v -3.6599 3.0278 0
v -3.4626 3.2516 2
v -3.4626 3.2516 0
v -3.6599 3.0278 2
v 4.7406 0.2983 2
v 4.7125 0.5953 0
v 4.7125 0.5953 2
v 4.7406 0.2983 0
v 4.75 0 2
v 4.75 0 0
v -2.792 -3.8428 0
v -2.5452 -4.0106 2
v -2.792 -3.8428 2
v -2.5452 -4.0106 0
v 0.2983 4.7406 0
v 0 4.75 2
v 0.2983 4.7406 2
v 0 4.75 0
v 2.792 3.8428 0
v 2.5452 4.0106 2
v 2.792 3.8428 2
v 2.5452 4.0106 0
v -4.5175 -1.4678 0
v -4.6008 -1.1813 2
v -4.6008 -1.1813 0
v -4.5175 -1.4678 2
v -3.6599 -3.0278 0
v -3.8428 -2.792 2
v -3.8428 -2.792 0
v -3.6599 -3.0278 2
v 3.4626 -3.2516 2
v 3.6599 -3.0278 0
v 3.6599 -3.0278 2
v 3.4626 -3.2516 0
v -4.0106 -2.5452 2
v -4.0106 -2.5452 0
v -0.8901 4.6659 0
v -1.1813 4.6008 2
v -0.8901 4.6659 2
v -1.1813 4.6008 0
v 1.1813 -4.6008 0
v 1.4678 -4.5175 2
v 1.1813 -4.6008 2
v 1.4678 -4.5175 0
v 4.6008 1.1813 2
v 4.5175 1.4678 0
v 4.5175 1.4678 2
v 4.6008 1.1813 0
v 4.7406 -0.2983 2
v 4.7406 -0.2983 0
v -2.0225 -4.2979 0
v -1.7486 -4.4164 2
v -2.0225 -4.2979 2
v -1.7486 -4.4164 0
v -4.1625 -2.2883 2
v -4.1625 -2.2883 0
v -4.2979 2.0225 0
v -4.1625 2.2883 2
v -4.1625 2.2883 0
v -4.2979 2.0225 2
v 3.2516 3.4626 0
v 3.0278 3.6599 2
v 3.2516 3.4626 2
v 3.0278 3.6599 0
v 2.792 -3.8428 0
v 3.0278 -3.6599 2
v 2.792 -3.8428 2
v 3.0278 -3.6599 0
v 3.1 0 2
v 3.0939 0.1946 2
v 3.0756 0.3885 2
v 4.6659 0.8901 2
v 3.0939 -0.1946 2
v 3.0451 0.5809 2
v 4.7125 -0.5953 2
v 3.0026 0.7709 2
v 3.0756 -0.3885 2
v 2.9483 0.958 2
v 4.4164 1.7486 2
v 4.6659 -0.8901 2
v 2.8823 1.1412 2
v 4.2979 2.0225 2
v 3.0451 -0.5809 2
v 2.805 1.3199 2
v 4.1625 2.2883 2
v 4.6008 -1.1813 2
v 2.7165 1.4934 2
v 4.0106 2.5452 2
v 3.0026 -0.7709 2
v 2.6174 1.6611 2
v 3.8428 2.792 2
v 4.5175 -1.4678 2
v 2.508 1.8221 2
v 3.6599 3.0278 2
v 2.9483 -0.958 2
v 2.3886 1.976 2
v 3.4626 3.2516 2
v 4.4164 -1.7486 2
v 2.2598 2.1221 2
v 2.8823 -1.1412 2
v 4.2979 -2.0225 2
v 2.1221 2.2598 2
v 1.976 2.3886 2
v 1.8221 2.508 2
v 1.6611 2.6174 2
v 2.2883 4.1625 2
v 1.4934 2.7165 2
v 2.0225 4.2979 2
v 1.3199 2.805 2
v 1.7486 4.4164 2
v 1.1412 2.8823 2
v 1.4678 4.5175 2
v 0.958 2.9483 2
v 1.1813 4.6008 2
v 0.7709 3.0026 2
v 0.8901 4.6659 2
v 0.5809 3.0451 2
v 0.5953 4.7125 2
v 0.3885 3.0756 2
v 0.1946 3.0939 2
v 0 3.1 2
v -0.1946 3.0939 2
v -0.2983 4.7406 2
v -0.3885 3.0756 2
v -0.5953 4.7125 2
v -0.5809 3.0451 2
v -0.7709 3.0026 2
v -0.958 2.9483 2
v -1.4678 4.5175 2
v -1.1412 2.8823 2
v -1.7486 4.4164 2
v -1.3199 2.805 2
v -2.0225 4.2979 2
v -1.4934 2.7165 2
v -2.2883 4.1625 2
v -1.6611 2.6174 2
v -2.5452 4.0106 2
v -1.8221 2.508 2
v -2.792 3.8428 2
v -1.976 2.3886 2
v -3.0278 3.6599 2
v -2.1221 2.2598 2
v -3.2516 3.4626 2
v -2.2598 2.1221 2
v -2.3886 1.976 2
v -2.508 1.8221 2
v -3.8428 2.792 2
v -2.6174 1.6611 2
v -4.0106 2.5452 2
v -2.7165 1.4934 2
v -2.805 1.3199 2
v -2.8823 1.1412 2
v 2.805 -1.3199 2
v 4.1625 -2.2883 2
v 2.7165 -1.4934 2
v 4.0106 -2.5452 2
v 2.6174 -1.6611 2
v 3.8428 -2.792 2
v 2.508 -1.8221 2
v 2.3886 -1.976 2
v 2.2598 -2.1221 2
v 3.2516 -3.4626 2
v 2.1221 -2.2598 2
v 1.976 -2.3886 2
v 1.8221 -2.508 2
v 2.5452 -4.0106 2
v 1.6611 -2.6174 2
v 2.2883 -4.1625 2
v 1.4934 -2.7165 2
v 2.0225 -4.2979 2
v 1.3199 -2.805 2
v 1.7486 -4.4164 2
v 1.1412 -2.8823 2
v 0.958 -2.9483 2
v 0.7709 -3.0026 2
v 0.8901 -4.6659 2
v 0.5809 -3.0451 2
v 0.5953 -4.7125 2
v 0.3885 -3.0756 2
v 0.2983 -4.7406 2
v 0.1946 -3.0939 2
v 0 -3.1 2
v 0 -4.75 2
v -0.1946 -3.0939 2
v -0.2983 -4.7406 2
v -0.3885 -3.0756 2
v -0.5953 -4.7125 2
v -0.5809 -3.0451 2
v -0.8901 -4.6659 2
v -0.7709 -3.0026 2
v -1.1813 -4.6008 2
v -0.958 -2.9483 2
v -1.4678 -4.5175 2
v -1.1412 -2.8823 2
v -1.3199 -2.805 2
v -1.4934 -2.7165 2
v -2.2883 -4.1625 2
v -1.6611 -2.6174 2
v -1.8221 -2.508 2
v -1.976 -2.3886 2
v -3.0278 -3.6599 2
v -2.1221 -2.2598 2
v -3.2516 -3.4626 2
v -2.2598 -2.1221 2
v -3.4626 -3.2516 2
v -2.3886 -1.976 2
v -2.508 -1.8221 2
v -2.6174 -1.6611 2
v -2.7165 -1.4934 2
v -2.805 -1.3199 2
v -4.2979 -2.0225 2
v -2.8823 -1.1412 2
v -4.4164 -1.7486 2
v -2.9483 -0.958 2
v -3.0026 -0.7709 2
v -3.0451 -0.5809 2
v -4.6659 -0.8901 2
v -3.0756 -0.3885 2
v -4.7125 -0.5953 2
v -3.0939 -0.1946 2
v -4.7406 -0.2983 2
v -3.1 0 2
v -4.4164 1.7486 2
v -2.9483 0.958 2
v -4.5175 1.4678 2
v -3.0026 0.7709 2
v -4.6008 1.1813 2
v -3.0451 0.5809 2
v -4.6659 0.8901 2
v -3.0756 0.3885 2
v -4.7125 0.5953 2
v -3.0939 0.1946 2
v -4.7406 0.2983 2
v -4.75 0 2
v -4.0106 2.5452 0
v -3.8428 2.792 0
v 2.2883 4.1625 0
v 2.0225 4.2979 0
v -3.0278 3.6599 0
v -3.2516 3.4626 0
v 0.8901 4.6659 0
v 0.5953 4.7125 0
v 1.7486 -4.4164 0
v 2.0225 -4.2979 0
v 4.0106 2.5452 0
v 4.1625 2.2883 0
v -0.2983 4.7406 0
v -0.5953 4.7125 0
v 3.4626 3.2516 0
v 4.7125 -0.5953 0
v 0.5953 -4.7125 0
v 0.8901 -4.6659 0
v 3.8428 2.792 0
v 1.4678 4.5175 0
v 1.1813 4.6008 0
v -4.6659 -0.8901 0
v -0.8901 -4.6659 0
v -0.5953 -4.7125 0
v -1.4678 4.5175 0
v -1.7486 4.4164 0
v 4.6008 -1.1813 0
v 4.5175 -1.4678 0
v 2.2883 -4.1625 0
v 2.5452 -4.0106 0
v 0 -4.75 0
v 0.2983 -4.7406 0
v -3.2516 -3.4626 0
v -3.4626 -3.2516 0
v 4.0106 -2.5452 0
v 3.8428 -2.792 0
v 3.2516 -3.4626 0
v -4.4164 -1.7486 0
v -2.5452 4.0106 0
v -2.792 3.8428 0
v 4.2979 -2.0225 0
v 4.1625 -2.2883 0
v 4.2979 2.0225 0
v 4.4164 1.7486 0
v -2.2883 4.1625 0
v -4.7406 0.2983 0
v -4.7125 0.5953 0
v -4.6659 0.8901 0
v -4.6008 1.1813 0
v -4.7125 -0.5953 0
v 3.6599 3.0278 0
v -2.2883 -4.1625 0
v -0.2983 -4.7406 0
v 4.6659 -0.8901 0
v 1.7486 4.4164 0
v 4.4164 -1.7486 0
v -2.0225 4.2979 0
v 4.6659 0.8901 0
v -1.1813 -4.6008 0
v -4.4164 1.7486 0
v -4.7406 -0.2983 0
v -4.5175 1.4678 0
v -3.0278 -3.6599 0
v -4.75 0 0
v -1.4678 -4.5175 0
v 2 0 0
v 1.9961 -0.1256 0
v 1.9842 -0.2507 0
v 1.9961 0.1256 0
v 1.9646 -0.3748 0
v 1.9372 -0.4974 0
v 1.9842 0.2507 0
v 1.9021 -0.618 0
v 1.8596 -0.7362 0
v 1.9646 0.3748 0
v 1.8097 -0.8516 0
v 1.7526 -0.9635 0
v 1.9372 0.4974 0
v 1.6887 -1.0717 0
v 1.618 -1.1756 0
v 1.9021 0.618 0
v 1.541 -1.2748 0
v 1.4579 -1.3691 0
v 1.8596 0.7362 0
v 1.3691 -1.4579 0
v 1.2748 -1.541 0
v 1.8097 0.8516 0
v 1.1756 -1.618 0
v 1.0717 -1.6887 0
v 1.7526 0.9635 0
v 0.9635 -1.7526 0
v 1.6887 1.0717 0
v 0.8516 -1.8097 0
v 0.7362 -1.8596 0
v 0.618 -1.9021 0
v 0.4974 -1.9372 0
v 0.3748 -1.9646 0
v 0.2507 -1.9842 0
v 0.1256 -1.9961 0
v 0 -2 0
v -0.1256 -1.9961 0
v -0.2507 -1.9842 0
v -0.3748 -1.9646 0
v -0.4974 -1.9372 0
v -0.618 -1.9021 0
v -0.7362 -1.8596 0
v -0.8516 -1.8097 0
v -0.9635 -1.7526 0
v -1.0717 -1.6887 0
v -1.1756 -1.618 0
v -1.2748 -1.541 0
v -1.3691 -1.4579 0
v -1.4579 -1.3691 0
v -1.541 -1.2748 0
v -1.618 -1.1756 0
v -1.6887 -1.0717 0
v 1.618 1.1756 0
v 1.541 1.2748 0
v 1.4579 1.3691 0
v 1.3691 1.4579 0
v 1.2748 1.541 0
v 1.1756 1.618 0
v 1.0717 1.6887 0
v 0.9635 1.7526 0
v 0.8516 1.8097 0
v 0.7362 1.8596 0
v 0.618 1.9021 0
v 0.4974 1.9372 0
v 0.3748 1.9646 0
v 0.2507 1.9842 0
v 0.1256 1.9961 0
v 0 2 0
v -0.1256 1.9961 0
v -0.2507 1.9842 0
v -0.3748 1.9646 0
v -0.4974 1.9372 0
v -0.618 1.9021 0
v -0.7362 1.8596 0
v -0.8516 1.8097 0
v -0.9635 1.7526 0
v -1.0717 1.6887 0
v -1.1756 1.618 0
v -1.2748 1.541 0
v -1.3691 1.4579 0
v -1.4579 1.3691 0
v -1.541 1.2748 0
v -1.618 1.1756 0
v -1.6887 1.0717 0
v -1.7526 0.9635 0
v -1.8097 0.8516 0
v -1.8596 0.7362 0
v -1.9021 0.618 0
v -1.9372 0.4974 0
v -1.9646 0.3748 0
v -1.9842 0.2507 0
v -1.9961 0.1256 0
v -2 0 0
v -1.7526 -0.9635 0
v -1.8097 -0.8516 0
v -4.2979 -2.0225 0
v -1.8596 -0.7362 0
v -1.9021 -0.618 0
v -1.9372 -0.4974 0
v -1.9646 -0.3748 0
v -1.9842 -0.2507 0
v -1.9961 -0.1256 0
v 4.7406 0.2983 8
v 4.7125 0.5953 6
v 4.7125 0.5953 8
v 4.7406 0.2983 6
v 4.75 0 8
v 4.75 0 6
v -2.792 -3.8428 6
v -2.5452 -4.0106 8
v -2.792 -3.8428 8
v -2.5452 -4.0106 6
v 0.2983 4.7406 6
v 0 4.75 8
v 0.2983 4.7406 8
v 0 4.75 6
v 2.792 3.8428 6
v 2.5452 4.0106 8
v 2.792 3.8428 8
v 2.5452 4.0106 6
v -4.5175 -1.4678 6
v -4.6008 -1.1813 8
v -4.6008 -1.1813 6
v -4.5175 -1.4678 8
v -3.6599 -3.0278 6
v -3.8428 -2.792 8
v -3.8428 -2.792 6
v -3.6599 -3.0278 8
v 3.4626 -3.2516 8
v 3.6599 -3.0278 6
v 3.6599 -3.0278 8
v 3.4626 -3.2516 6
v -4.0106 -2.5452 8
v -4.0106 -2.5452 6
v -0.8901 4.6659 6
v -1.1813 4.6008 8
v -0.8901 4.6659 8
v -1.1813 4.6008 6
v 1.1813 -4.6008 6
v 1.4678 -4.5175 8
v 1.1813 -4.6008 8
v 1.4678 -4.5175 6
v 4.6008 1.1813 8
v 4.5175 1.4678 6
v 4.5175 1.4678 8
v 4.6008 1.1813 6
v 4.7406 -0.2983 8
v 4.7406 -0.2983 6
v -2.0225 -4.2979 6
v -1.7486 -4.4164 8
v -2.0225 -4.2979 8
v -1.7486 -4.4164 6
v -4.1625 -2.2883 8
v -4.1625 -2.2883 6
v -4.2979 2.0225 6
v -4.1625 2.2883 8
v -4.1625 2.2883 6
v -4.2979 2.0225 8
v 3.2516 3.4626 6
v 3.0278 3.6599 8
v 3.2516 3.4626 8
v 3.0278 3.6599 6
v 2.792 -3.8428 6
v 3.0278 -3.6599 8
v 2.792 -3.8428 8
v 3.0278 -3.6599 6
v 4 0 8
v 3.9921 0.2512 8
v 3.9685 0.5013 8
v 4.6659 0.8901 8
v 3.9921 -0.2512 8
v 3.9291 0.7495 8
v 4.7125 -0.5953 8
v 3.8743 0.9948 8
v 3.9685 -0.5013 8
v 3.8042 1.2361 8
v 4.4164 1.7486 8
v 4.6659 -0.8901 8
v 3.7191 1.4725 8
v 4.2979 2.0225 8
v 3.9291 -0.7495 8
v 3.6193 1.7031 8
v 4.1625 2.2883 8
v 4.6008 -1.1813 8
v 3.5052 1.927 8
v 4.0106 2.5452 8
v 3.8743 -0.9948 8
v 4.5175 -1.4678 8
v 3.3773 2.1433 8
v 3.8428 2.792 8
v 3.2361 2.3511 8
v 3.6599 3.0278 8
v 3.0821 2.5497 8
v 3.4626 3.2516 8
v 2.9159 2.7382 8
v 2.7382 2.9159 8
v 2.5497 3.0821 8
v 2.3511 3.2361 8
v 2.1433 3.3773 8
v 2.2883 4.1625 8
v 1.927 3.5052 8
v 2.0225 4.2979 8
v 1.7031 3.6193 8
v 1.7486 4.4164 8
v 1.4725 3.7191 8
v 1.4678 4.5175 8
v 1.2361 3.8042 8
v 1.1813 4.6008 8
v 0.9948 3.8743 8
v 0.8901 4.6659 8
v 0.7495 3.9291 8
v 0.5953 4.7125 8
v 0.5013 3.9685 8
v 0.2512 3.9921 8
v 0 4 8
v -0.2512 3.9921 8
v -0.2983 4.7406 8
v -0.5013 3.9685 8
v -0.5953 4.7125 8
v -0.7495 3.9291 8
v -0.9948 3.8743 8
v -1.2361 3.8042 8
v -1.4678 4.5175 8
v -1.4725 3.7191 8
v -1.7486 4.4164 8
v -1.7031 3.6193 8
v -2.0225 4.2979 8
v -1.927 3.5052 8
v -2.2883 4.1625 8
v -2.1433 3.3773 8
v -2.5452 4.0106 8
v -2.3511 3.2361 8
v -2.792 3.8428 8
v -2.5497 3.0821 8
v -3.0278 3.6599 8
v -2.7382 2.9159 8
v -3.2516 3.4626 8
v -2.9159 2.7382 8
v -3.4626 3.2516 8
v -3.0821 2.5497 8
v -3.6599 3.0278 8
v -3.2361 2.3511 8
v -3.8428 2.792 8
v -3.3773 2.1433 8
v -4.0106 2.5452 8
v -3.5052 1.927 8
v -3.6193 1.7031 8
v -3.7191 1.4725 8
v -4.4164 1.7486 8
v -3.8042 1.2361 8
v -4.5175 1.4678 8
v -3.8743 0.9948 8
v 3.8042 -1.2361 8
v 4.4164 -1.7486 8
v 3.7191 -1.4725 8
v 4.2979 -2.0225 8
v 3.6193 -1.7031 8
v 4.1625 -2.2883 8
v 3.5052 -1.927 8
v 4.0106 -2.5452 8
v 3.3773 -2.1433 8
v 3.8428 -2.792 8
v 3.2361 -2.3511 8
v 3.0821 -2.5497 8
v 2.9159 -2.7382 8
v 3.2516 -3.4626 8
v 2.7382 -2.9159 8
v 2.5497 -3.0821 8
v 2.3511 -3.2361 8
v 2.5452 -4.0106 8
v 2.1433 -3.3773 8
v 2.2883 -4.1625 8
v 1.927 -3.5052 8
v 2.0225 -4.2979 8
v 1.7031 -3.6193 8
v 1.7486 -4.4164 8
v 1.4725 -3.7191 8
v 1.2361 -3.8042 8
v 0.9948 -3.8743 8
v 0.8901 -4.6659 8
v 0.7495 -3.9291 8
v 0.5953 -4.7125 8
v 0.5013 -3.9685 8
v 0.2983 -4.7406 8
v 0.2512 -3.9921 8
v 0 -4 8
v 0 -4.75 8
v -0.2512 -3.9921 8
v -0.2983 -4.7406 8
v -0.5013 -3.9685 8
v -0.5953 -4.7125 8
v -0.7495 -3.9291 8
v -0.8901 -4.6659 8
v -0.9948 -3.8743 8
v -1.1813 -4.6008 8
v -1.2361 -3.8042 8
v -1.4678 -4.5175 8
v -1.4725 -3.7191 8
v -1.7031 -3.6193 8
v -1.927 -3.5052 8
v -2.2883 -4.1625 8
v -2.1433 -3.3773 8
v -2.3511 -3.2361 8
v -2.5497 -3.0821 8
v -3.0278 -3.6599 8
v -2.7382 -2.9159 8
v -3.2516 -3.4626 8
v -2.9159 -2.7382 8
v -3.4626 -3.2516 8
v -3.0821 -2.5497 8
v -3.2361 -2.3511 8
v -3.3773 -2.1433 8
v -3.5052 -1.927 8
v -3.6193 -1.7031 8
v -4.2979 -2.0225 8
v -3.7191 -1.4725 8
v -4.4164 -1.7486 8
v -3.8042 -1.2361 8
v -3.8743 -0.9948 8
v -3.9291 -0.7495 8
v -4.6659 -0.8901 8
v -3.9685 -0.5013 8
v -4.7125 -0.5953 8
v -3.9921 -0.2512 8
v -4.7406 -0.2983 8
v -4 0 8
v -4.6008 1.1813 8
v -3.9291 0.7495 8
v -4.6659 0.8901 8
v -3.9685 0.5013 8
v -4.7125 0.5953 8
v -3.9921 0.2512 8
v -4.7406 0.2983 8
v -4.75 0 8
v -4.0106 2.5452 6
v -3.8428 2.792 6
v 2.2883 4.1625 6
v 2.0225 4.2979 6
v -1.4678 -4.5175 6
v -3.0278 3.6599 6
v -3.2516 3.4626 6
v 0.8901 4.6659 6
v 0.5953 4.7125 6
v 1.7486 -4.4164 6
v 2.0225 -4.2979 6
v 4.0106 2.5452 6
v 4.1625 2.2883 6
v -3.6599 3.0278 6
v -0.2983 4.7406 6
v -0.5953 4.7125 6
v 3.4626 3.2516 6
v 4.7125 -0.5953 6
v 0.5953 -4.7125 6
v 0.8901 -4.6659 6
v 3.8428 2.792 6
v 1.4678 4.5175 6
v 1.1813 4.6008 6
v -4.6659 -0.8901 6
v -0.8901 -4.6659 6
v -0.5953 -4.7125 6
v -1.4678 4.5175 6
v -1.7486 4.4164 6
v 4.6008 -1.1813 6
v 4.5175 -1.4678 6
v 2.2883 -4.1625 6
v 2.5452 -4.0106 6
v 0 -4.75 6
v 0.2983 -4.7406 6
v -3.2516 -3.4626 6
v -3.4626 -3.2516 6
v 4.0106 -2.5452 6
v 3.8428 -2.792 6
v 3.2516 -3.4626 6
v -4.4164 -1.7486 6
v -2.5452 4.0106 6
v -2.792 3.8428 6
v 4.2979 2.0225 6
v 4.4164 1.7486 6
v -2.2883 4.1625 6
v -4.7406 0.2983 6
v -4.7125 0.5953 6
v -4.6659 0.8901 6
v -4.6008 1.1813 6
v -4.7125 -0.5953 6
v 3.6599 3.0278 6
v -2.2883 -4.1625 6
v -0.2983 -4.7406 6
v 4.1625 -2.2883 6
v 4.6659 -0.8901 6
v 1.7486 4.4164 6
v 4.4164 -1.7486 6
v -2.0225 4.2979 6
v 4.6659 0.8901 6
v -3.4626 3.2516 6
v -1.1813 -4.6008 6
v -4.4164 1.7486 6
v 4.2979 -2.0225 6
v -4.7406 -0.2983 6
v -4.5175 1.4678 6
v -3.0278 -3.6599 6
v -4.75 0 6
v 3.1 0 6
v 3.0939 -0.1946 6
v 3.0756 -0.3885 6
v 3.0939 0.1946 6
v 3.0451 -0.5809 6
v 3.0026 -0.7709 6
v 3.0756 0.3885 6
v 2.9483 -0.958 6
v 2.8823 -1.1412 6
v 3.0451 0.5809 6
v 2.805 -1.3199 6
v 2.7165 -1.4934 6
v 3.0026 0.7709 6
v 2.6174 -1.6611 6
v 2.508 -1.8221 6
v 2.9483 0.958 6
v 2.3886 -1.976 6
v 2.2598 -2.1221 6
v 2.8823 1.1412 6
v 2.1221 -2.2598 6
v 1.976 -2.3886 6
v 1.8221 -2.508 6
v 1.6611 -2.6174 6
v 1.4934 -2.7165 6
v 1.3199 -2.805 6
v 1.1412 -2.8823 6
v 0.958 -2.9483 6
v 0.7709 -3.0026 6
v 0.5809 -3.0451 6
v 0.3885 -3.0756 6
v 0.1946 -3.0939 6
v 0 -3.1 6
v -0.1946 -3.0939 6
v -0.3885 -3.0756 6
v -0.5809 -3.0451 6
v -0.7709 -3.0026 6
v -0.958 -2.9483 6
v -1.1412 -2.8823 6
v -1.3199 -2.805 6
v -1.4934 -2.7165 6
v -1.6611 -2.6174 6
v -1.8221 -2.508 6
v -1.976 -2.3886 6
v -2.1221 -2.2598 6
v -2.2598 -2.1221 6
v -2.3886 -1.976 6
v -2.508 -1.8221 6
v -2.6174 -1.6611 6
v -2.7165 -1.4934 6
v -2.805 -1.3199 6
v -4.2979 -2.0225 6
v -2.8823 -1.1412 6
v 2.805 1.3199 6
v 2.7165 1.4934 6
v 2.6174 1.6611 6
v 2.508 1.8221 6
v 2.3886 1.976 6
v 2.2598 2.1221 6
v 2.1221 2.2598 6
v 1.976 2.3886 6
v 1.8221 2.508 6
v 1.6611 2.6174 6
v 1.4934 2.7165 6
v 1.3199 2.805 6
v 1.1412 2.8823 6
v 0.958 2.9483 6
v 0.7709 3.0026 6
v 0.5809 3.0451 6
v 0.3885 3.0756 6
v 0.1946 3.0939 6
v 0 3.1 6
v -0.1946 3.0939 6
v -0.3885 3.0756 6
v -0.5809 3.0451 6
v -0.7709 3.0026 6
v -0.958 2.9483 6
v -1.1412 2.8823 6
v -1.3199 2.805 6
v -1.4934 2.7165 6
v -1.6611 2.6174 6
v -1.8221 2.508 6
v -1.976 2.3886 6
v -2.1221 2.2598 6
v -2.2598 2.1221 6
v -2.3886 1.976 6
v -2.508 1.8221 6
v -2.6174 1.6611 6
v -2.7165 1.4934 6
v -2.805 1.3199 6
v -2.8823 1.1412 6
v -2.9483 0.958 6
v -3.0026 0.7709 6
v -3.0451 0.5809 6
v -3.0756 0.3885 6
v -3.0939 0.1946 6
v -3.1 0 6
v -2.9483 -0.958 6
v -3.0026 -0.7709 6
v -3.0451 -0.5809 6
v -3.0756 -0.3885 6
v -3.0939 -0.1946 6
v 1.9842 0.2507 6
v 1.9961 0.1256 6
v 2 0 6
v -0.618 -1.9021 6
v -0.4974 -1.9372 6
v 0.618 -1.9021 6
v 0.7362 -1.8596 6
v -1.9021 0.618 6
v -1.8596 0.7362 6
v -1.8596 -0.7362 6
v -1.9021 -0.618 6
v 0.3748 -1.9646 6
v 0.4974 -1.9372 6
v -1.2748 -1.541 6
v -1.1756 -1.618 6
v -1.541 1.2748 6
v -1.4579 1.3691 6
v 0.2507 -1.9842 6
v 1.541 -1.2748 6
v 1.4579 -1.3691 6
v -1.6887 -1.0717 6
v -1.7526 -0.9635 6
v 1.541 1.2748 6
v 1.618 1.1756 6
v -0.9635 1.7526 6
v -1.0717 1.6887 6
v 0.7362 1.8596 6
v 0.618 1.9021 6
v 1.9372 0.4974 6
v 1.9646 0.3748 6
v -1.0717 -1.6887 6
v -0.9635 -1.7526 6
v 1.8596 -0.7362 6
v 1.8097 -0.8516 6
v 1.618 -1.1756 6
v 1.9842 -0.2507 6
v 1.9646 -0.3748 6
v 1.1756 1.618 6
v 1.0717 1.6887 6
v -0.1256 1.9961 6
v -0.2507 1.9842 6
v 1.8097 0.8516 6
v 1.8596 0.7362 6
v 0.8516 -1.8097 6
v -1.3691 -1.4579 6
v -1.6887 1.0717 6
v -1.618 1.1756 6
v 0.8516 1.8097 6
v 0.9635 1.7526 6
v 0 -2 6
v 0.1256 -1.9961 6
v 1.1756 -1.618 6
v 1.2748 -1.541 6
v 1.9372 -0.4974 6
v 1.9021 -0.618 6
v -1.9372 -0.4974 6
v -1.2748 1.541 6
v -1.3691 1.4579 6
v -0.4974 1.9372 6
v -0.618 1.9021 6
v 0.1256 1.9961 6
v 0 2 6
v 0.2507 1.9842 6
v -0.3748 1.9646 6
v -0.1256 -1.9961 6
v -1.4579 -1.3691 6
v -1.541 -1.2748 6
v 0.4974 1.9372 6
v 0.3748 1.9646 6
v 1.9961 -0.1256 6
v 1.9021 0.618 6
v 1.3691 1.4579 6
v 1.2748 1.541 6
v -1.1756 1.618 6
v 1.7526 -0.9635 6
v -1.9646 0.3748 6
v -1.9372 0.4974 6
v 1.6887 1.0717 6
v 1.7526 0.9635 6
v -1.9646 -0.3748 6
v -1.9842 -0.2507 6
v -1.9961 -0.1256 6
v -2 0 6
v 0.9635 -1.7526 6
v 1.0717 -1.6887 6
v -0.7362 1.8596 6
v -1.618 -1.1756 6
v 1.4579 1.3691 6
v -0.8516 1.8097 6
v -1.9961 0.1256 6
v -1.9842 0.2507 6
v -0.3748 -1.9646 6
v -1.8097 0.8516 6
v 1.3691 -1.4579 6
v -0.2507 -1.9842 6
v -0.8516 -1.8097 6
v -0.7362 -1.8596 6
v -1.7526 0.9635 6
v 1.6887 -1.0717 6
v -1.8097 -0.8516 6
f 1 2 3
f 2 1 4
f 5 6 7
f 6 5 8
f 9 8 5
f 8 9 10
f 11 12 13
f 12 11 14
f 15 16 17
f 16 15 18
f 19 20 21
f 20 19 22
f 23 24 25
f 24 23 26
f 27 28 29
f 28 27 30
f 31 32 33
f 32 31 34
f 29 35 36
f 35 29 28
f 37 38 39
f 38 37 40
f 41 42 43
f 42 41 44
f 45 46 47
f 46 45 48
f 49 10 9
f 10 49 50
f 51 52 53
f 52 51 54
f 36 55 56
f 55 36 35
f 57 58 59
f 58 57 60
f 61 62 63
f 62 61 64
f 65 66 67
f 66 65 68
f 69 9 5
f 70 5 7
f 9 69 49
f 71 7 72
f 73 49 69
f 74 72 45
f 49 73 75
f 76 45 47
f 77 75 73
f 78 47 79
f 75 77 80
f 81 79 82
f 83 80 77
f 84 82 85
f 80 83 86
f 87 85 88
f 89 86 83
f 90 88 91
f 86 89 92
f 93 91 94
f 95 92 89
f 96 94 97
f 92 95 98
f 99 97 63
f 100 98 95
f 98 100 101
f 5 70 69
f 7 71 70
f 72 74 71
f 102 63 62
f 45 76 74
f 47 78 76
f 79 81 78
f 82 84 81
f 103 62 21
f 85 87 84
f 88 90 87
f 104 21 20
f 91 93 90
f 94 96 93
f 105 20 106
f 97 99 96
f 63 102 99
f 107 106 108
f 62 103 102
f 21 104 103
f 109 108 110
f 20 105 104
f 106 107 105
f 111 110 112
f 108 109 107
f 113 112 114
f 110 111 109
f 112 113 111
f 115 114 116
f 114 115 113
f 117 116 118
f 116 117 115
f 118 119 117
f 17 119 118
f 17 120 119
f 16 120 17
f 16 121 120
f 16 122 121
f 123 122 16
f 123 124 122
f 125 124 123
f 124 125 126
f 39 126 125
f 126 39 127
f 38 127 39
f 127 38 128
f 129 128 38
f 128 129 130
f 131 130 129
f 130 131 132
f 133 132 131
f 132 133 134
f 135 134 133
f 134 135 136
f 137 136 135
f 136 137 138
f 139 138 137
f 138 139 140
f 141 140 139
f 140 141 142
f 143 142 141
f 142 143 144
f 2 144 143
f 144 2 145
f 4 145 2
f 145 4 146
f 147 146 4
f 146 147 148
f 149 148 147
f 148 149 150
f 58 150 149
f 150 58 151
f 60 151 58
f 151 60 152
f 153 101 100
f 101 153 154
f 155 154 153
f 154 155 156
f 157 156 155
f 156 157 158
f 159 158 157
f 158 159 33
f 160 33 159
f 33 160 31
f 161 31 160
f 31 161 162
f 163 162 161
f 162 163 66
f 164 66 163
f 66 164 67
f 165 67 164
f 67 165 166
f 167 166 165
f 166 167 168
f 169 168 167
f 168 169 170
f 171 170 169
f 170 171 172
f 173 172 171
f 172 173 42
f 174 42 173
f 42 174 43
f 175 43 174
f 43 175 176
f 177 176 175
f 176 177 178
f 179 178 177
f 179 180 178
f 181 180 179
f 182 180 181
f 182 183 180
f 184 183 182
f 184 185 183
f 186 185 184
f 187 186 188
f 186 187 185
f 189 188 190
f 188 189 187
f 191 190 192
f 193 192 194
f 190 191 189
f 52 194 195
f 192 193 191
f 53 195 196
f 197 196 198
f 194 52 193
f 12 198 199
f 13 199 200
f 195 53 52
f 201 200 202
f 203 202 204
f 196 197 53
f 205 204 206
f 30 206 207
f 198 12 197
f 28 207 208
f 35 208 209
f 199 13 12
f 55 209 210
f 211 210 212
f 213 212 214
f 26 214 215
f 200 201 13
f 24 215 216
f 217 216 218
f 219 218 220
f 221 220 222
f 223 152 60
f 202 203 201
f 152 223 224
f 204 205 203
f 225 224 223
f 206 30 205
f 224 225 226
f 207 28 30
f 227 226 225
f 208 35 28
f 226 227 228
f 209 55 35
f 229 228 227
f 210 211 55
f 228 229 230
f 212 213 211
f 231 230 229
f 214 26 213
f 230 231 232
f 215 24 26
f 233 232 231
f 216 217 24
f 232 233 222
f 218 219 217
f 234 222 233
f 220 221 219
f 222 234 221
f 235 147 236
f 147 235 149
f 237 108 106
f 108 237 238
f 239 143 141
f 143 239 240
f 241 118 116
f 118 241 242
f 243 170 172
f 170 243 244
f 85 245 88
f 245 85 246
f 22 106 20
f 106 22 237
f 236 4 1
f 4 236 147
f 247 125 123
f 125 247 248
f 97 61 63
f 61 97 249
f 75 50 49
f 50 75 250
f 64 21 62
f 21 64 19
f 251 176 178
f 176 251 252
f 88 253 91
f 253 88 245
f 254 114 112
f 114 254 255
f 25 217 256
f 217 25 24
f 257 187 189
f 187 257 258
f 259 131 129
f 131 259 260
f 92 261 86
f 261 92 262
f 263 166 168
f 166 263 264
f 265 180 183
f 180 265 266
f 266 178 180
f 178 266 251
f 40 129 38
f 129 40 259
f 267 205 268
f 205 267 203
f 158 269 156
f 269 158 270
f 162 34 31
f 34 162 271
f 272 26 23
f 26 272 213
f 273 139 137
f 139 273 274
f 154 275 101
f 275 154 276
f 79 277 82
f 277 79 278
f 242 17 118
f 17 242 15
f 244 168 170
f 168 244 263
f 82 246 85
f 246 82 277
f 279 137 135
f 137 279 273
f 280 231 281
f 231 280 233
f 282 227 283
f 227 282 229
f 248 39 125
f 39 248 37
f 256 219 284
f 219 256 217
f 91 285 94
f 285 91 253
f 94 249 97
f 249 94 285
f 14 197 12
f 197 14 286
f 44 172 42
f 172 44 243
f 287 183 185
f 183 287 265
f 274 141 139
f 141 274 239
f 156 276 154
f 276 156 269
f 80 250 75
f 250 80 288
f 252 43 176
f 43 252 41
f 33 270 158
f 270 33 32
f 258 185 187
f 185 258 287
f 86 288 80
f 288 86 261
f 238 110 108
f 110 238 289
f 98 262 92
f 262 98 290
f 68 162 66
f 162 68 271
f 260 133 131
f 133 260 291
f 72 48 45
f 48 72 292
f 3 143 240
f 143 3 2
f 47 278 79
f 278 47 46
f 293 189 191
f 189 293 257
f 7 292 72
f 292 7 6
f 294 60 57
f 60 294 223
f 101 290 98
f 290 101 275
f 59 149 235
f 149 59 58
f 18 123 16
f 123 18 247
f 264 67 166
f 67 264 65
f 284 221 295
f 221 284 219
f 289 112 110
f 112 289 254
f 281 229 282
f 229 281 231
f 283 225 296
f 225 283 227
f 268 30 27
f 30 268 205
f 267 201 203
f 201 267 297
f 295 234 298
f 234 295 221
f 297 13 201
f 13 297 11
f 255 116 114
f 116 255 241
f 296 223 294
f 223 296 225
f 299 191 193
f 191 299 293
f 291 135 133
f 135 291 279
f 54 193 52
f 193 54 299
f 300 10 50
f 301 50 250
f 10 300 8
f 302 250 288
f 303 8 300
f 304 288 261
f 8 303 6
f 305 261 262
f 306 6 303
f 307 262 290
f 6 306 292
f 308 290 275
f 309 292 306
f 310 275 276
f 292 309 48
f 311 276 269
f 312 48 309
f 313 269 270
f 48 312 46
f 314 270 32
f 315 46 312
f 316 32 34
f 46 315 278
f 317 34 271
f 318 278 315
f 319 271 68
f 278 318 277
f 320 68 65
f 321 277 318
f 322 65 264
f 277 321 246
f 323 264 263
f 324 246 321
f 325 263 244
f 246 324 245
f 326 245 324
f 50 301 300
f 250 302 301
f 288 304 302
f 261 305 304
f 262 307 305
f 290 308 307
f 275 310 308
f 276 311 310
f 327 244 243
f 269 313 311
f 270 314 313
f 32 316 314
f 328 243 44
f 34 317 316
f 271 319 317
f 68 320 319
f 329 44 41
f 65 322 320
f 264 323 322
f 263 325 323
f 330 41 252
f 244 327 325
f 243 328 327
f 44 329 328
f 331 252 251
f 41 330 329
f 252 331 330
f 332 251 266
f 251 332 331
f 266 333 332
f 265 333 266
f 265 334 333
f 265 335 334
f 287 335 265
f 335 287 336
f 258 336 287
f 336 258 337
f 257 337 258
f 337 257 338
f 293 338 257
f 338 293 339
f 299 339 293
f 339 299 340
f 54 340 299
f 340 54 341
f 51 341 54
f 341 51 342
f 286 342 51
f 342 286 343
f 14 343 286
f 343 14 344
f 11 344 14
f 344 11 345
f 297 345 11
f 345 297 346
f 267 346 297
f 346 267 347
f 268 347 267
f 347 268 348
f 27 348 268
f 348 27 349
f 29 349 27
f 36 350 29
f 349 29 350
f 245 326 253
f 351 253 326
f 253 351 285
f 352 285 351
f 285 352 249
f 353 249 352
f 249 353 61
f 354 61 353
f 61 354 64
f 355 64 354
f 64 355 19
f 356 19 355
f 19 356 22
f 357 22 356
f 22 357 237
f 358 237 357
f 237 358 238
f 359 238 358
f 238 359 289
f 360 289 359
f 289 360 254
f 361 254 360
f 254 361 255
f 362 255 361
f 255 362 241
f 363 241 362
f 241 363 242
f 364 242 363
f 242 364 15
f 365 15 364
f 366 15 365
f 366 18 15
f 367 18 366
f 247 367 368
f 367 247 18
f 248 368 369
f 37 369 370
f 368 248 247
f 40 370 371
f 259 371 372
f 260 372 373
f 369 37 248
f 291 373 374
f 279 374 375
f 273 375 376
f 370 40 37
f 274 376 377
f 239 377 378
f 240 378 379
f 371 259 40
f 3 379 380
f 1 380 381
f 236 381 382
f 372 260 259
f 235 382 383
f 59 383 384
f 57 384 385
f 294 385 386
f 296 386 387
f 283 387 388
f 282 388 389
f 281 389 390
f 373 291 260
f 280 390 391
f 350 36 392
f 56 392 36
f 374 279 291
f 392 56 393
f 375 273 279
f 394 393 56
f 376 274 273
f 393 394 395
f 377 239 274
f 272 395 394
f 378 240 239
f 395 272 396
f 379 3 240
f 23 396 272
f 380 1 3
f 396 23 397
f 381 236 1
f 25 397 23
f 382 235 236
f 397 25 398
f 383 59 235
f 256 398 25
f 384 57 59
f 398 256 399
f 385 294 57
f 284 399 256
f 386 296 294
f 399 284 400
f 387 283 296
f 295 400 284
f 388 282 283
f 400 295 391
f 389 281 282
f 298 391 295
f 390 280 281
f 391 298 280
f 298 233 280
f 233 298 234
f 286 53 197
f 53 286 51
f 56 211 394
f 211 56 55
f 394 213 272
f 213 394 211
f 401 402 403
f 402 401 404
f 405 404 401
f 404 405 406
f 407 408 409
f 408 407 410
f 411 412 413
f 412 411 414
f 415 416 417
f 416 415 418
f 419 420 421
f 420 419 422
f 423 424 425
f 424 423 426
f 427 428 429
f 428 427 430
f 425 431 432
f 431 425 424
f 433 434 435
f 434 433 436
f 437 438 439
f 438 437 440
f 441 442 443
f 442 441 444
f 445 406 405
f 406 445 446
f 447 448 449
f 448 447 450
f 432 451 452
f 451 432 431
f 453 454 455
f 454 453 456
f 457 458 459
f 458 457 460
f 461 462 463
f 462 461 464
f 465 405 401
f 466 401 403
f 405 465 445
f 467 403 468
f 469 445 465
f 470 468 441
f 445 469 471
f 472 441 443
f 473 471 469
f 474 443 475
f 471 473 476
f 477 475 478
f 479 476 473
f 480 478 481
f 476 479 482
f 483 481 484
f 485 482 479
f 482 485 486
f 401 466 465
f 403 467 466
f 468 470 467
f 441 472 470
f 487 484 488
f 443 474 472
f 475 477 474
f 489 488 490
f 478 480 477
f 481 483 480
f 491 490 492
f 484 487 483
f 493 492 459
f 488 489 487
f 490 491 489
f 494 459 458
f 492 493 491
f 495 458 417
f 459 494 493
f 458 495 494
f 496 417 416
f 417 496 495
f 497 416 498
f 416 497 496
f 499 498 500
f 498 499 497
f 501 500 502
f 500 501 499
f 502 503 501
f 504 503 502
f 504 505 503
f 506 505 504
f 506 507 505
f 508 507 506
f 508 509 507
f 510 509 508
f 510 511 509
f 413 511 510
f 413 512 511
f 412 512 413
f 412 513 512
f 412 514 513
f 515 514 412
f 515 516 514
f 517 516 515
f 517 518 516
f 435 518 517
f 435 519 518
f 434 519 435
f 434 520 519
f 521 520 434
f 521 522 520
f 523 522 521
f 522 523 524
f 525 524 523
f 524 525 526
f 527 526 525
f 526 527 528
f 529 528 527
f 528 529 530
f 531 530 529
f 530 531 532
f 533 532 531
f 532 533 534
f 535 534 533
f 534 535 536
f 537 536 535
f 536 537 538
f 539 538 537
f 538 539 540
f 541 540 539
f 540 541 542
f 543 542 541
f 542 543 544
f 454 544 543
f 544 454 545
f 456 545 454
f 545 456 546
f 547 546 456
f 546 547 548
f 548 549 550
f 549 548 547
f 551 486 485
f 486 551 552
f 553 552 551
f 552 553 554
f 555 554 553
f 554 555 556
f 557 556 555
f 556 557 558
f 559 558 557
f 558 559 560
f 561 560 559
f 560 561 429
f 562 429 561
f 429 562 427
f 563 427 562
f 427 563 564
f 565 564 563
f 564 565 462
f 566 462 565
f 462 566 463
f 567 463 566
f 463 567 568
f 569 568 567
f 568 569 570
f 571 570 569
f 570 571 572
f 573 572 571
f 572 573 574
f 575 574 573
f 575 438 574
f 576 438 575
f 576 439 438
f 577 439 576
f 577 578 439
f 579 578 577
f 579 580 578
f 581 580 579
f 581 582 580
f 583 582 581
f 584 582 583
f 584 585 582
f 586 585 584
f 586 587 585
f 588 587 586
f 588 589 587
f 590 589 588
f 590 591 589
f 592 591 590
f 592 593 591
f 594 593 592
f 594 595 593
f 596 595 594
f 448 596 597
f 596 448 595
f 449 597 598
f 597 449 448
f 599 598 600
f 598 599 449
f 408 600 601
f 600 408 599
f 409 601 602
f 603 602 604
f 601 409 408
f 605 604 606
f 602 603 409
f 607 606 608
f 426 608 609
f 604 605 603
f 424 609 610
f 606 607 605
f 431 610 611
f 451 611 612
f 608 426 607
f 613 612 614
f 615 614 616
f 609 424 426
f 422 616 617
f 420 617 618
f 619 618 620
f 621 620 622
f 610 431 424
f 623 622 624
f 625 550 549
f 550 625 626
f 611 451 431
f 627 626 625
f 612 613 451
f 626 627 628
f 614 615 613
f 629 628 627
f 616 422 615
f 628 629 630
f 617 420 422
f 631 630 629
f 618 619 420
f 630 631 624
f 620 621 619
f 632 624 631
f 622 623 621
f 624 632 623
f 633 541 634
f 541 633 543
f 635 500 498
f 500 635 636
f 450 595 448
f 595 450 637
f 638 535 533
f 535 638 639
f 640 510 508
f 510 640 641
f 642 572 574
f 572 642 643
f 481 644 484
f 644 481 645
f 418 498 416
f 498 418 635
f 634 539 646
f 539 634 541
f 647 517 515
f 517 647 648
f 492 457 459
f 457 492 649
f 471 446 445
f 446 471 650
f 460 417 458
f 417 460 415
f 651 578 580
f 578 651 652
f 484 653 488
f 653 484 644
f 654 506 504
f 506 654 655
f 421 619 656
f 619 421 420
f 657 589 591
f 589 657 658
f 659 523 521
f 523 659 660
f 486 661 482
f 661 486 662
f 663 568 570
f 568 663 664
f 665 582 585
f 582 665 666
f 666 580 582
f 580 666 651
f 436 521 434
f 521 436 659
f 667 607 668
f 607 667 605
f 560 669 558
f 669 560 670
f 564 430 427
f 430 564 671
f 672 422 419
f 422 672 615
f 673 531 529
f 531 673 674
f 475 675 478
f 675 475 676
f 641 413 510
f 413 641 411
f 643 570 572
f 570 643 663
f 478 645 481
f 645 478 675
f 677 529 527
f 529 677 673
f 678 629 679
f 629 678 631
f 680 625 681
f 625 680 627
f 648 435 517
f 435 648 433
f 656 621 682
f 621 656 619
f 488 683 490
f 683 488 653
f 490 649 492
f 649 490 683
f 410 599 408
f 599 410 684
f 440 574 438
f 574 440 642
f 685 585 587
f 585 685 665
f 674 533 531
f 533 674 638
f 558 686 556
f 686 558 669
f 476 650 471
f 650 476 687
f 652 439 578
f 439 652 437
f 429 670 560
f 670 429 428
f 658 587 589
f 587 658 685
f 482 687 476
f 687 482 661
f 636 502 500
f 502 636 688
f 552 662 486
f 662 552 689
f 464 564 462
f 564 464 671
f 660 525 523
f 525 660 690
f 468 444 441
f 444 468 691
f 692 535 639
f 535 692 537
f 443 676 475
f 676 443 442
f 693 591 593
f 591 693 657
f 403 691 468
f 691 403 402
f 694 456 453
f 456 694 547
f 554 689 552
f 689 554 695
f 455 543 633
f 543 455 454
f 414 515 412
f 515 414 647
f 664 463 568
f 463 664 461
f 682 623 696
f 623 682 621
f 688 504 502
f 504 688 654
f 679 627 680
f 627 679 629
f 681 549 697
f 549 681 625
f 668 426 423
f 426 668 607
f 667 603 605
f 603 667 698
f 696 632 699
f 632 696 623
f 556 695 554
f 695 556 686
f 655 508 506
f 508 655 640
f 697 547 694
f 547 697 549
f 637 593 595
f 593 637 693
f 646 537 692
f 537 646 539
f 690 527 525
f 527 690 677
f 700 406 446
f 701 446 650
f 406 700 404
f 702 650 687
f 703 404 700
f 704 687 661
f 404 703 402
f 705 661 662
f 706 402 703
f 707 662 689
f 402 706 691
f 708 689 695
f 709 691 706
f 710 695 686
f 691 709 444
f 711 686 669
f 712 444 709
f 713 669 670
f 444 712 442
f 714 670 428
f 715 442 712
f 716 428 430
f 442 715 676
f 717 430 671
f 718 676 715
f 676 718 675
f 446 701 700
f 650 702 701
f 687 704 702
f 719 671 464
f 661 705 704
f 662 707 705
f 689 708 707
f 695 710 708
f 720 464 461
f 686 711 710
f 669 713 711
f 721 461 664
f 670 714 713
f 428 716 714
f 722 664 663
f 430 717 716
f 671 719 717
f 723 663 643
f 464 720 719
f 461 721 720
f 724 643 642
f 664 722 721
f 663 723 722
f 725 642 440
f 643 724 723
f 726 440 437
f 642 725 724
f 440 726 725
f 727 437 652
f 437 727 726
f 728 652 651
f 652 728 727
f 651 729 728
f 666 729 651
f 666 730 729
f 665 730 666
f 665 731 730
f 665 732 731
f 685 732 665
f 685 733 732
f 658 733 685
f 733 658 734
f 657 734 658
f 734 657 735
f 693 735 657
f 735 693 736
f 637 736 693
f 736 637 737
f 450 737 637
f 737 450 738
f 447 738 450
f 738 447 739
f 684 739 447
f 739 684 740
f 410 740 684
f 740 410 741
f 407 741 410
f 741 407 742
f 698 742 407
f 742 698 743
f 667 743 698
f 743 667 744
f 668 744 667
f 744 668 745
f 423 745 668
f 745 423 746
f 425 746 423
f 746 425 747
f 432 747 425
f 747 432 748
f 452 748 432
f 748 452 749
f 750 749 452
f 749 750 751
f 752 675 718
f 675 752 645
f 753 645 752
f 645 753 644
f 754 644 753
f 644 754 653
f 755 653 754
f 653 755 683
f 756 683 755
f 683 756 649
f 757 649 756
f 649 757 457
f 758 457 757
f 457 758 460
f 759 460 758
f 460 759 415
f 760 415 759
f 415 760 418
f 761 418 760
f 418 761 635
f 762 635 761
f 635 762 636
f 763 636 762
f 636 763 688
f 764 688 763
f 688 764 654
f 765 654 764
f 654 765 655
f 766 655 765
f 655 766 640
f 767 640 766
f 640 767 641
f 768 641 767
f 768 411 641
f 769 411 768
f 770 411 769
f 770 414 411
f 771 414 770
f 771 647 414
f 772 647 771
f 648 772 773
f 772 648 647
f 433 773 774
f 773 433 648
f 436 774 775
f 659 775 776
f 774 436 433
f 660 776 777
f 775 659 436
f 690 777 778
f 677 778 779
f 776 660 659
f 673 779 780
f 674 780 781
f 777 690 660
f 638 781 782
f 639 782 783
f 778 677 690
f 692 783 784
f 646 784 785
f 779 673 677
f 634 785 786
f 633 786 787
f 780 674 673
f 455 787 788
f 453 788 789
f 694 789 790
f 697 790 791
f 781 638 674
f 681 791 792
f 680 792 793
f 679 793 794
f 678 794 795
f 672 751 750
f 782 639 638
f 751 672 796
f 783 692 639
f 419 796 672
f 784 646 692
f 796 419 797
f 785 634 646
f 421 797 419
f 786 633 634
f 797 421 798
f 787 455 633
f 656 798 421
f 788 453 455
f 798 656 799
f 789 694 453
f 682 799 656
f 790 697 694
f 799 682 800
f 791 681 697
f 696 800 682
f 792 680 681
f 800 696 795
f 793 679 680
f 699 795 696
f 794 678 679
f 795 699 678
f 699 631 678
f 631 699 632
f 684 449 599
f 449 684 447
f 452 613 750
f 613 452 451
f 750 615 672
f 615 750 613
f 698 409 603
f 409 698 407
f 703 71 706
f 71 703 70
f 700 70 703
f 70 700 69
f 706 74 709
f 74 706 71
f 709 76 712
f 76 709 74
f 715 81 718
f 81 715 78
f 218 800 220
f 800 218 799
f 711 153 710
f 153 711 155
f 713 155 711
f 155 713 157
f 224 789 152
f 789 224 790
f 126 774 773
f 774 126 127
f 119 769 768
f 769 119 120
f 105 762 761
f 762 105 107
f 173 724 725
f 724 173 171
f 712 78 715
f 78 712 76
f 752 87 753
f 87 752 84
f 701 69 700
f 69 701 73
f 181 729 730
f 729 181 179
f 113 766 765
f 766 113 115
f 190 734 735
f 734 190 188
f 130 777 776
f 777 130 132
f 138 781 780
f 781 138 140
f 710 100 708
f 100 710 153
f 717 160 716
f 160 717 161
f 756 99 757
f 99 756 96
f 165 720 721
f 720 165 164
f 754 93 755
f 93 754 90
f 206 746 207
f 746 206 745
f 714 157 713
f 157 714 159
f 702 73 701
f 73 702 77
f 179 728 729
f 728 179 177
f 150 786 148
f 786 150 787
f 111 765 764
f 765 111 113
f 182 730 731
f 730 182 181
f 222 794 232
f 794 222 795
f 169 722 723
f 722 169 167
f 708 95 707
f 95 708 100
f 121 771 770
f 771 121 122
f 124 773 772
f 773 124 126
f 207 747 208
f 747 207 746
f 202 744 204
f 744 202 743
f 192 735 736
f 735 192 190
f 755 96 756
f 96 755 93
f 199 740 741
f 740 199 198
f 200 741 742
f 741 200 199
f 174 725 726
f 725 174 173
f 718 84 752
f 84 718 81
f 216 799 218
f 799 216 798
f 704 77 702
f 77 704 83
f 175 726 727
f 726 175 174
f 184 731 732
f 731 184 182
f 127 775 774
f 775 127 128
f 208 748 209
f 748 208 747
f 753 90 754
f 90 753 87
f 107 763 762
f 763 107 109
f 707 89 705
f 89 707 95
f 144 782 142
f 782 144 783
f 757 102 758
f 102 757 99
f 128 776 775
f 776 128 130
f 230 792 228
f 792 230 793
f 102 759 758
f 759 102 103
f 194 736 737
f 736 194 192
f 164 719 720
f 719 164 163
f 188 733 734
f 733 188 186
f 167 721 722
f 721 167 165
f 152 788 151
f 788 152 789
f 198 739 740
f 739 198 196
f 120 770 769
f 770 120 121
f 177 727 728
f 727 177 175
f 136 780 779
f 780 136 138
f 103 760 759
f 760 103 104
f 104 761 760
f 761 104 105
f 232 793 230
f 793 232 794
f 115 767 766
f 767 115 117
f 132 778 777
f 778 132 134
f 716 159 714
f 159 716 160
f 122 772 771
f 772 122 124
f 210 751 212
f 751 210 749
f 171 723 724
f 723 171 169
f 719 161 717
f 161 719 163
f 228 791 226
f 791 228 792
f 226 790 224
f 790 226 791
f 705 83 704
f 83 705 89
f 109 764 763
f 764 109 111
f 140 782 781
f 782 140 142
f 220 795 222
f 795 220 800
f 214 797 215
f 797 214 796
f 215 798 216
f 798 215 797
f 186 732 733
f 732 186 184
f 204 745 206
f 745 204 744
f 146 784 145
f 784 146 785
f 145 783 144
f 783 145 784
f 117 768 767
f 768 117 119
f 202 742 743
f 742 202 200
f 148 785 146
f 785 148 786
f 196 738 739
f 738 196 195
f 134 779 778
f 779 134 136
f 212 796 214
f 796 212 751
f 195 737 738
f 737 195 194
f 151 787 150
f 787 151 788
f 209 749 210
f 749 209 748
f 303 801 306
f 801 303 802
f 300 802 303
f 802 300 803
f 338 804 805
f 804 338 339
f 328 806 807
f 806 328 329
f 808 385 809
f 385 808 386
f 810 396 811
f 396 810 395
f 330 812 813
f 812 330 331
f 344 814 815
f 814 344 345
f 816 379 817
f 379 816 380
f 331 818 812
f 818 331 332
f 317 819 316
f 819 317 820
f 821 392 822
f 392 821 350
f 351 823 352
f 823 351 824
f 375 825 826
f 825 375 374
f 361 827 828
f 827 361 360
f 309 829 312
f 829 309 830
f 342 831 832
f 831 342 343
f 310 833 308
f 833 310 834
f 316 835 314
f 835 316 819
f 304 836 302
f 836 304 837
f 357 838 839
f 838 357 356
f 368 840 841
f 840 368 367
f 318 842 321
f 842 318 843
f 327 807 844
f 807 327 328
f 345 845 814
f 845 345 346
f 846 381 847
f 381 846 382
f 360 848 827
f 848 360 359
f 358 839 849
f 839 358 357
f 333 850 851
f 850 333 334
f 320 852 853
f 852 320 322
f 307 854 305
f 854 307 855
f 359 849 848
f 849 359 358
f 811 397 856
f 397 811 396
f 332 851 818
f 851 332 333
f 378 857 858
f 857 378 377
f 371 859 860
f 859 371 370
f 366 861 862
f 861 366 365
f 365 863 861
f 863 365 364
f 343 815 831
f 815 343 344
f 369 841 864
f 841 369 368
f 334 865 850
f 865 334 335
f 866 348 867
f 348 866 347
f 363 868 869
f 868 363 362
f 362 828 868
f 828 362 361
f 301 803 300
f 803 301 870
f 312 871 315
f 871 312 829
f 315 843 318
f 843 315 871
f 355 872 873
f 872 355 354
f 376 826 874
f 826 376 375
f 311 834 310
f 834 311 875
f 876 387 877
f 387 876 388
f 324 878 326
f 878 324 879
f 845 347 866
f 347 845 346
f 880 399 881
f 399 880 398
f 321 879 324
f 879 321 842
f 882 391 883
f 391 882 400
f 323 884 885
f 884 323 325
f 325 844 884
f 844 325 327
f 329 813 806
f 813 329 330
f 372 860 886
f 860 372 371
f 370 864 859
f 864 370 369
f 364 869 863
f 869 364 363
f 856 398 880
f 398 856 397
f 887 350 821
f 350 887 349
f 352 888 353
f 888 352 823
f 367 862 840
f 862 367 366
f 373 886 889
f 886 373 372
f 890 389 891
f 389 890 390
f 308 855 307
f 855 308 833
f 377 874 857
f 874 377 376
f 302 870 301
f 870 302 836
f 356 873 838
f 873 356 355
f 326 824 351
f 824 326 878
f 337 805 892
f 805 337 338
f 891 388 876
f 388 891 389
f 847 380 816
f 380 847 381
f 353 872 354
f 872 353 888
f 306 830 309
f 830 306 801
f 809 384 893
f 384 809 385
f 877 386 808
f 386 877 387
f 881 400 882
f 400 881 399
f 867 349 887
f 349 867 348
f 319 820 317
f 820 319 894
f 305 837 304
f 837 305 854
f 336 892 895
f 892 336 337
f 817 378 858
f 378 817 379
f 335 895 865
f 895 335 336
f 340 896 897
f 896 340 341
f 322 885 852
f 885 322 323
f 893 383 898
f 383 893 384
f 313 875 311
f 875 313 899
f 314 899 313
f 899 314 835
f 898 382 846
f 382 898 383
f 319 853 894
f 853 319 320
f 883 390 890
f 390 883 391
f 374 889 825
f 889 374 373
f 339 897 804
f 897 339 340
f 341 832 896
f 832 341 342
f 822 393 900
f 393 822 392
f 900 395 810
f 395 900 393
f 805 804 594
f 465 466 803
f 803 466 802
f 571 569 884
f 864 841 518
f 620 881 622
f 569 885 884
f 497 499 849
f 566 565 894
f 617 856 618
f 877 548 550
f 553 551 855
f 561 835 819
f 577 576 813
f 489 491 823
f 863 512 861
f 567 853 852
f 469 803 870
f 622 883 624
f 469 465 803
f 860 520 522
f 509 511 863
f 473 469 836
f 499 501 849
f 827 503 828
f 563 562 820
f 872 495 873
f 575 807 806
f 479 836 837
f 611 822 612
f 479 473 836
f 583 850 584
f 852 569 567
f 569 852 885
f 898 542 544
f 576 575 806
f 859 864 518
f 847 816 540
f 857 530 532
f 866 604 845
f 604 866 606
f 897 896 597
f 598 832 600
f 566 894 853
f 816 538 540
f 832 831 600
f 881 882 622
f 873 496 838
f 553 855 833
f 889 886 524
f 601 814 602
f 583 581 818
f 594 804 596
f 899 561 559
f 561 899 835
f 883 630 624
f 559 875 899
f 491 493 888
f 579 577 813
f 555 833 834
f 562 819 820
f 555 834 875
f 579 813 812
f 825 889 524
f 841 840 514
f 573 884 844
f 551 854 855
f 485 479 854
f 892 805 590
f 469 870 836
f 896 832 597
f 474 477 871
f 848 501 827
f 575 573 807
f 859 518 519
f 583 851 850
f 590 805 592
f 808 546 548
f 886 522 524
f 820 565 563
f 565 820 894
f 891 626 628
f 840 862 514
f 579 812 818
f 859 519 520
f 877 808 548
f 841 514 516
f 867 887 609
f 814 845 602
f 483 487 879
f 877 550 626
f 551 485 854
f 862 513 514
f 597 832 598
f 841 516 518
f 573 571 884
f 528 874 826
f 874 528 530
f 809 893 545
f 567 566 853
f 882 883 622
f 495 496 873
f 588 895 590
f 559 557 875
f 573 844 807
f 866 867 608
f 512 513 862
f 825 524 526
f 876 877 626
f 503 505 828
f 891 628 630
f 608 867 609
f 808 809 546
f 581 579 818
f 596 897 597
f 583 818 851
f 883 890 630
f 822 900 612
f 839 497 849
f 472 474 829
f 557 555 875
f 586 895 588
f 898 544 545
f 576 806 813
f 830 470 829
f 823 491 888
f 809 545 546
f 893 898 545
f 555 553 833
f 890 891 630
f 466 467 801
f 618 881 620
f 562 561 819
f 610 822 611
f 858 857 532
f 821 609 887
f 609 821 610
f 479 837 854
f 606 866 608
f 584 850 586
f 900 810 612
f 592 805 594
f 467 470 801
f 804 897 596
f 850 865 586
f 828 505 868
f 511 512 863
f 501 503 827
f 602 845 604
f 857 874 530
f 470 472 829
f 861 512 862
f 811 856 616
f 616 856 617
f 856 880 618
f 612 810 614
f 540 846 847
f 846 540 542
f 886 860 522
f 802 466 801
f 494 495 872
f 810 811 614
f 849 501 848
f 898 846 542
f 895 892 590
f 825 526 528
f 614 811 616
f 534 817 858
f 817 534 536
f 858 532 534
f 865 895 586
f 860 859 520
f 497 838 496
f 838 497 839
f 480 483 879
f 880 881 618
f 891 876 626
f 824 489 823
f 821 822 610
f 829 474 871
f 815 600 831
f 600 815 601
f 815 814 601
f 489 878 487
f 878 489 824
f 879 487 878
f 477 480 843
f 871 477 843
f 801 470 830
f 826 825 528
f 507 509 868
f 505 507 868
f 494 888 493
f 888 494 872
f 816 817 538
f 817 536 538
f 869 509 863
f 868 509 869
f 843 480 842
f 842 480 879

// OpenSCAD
resolution = 100;
module but () {cylinder (r=9.5/2,h=2, $fn=resolution);

translate([0,0,6]) cylinder (r=9.5/2,h=2, $fn=resolution);

cylinder (r=6.2/2,h=8, $fn=resolution);
}


difference () {
but();
cylinder (r=4/2,h=8, $fn=resolution);
translate ([0,0,6]) cylinder (r1=4/2, r2=8/2, h=2, $fn=resolution);
}
